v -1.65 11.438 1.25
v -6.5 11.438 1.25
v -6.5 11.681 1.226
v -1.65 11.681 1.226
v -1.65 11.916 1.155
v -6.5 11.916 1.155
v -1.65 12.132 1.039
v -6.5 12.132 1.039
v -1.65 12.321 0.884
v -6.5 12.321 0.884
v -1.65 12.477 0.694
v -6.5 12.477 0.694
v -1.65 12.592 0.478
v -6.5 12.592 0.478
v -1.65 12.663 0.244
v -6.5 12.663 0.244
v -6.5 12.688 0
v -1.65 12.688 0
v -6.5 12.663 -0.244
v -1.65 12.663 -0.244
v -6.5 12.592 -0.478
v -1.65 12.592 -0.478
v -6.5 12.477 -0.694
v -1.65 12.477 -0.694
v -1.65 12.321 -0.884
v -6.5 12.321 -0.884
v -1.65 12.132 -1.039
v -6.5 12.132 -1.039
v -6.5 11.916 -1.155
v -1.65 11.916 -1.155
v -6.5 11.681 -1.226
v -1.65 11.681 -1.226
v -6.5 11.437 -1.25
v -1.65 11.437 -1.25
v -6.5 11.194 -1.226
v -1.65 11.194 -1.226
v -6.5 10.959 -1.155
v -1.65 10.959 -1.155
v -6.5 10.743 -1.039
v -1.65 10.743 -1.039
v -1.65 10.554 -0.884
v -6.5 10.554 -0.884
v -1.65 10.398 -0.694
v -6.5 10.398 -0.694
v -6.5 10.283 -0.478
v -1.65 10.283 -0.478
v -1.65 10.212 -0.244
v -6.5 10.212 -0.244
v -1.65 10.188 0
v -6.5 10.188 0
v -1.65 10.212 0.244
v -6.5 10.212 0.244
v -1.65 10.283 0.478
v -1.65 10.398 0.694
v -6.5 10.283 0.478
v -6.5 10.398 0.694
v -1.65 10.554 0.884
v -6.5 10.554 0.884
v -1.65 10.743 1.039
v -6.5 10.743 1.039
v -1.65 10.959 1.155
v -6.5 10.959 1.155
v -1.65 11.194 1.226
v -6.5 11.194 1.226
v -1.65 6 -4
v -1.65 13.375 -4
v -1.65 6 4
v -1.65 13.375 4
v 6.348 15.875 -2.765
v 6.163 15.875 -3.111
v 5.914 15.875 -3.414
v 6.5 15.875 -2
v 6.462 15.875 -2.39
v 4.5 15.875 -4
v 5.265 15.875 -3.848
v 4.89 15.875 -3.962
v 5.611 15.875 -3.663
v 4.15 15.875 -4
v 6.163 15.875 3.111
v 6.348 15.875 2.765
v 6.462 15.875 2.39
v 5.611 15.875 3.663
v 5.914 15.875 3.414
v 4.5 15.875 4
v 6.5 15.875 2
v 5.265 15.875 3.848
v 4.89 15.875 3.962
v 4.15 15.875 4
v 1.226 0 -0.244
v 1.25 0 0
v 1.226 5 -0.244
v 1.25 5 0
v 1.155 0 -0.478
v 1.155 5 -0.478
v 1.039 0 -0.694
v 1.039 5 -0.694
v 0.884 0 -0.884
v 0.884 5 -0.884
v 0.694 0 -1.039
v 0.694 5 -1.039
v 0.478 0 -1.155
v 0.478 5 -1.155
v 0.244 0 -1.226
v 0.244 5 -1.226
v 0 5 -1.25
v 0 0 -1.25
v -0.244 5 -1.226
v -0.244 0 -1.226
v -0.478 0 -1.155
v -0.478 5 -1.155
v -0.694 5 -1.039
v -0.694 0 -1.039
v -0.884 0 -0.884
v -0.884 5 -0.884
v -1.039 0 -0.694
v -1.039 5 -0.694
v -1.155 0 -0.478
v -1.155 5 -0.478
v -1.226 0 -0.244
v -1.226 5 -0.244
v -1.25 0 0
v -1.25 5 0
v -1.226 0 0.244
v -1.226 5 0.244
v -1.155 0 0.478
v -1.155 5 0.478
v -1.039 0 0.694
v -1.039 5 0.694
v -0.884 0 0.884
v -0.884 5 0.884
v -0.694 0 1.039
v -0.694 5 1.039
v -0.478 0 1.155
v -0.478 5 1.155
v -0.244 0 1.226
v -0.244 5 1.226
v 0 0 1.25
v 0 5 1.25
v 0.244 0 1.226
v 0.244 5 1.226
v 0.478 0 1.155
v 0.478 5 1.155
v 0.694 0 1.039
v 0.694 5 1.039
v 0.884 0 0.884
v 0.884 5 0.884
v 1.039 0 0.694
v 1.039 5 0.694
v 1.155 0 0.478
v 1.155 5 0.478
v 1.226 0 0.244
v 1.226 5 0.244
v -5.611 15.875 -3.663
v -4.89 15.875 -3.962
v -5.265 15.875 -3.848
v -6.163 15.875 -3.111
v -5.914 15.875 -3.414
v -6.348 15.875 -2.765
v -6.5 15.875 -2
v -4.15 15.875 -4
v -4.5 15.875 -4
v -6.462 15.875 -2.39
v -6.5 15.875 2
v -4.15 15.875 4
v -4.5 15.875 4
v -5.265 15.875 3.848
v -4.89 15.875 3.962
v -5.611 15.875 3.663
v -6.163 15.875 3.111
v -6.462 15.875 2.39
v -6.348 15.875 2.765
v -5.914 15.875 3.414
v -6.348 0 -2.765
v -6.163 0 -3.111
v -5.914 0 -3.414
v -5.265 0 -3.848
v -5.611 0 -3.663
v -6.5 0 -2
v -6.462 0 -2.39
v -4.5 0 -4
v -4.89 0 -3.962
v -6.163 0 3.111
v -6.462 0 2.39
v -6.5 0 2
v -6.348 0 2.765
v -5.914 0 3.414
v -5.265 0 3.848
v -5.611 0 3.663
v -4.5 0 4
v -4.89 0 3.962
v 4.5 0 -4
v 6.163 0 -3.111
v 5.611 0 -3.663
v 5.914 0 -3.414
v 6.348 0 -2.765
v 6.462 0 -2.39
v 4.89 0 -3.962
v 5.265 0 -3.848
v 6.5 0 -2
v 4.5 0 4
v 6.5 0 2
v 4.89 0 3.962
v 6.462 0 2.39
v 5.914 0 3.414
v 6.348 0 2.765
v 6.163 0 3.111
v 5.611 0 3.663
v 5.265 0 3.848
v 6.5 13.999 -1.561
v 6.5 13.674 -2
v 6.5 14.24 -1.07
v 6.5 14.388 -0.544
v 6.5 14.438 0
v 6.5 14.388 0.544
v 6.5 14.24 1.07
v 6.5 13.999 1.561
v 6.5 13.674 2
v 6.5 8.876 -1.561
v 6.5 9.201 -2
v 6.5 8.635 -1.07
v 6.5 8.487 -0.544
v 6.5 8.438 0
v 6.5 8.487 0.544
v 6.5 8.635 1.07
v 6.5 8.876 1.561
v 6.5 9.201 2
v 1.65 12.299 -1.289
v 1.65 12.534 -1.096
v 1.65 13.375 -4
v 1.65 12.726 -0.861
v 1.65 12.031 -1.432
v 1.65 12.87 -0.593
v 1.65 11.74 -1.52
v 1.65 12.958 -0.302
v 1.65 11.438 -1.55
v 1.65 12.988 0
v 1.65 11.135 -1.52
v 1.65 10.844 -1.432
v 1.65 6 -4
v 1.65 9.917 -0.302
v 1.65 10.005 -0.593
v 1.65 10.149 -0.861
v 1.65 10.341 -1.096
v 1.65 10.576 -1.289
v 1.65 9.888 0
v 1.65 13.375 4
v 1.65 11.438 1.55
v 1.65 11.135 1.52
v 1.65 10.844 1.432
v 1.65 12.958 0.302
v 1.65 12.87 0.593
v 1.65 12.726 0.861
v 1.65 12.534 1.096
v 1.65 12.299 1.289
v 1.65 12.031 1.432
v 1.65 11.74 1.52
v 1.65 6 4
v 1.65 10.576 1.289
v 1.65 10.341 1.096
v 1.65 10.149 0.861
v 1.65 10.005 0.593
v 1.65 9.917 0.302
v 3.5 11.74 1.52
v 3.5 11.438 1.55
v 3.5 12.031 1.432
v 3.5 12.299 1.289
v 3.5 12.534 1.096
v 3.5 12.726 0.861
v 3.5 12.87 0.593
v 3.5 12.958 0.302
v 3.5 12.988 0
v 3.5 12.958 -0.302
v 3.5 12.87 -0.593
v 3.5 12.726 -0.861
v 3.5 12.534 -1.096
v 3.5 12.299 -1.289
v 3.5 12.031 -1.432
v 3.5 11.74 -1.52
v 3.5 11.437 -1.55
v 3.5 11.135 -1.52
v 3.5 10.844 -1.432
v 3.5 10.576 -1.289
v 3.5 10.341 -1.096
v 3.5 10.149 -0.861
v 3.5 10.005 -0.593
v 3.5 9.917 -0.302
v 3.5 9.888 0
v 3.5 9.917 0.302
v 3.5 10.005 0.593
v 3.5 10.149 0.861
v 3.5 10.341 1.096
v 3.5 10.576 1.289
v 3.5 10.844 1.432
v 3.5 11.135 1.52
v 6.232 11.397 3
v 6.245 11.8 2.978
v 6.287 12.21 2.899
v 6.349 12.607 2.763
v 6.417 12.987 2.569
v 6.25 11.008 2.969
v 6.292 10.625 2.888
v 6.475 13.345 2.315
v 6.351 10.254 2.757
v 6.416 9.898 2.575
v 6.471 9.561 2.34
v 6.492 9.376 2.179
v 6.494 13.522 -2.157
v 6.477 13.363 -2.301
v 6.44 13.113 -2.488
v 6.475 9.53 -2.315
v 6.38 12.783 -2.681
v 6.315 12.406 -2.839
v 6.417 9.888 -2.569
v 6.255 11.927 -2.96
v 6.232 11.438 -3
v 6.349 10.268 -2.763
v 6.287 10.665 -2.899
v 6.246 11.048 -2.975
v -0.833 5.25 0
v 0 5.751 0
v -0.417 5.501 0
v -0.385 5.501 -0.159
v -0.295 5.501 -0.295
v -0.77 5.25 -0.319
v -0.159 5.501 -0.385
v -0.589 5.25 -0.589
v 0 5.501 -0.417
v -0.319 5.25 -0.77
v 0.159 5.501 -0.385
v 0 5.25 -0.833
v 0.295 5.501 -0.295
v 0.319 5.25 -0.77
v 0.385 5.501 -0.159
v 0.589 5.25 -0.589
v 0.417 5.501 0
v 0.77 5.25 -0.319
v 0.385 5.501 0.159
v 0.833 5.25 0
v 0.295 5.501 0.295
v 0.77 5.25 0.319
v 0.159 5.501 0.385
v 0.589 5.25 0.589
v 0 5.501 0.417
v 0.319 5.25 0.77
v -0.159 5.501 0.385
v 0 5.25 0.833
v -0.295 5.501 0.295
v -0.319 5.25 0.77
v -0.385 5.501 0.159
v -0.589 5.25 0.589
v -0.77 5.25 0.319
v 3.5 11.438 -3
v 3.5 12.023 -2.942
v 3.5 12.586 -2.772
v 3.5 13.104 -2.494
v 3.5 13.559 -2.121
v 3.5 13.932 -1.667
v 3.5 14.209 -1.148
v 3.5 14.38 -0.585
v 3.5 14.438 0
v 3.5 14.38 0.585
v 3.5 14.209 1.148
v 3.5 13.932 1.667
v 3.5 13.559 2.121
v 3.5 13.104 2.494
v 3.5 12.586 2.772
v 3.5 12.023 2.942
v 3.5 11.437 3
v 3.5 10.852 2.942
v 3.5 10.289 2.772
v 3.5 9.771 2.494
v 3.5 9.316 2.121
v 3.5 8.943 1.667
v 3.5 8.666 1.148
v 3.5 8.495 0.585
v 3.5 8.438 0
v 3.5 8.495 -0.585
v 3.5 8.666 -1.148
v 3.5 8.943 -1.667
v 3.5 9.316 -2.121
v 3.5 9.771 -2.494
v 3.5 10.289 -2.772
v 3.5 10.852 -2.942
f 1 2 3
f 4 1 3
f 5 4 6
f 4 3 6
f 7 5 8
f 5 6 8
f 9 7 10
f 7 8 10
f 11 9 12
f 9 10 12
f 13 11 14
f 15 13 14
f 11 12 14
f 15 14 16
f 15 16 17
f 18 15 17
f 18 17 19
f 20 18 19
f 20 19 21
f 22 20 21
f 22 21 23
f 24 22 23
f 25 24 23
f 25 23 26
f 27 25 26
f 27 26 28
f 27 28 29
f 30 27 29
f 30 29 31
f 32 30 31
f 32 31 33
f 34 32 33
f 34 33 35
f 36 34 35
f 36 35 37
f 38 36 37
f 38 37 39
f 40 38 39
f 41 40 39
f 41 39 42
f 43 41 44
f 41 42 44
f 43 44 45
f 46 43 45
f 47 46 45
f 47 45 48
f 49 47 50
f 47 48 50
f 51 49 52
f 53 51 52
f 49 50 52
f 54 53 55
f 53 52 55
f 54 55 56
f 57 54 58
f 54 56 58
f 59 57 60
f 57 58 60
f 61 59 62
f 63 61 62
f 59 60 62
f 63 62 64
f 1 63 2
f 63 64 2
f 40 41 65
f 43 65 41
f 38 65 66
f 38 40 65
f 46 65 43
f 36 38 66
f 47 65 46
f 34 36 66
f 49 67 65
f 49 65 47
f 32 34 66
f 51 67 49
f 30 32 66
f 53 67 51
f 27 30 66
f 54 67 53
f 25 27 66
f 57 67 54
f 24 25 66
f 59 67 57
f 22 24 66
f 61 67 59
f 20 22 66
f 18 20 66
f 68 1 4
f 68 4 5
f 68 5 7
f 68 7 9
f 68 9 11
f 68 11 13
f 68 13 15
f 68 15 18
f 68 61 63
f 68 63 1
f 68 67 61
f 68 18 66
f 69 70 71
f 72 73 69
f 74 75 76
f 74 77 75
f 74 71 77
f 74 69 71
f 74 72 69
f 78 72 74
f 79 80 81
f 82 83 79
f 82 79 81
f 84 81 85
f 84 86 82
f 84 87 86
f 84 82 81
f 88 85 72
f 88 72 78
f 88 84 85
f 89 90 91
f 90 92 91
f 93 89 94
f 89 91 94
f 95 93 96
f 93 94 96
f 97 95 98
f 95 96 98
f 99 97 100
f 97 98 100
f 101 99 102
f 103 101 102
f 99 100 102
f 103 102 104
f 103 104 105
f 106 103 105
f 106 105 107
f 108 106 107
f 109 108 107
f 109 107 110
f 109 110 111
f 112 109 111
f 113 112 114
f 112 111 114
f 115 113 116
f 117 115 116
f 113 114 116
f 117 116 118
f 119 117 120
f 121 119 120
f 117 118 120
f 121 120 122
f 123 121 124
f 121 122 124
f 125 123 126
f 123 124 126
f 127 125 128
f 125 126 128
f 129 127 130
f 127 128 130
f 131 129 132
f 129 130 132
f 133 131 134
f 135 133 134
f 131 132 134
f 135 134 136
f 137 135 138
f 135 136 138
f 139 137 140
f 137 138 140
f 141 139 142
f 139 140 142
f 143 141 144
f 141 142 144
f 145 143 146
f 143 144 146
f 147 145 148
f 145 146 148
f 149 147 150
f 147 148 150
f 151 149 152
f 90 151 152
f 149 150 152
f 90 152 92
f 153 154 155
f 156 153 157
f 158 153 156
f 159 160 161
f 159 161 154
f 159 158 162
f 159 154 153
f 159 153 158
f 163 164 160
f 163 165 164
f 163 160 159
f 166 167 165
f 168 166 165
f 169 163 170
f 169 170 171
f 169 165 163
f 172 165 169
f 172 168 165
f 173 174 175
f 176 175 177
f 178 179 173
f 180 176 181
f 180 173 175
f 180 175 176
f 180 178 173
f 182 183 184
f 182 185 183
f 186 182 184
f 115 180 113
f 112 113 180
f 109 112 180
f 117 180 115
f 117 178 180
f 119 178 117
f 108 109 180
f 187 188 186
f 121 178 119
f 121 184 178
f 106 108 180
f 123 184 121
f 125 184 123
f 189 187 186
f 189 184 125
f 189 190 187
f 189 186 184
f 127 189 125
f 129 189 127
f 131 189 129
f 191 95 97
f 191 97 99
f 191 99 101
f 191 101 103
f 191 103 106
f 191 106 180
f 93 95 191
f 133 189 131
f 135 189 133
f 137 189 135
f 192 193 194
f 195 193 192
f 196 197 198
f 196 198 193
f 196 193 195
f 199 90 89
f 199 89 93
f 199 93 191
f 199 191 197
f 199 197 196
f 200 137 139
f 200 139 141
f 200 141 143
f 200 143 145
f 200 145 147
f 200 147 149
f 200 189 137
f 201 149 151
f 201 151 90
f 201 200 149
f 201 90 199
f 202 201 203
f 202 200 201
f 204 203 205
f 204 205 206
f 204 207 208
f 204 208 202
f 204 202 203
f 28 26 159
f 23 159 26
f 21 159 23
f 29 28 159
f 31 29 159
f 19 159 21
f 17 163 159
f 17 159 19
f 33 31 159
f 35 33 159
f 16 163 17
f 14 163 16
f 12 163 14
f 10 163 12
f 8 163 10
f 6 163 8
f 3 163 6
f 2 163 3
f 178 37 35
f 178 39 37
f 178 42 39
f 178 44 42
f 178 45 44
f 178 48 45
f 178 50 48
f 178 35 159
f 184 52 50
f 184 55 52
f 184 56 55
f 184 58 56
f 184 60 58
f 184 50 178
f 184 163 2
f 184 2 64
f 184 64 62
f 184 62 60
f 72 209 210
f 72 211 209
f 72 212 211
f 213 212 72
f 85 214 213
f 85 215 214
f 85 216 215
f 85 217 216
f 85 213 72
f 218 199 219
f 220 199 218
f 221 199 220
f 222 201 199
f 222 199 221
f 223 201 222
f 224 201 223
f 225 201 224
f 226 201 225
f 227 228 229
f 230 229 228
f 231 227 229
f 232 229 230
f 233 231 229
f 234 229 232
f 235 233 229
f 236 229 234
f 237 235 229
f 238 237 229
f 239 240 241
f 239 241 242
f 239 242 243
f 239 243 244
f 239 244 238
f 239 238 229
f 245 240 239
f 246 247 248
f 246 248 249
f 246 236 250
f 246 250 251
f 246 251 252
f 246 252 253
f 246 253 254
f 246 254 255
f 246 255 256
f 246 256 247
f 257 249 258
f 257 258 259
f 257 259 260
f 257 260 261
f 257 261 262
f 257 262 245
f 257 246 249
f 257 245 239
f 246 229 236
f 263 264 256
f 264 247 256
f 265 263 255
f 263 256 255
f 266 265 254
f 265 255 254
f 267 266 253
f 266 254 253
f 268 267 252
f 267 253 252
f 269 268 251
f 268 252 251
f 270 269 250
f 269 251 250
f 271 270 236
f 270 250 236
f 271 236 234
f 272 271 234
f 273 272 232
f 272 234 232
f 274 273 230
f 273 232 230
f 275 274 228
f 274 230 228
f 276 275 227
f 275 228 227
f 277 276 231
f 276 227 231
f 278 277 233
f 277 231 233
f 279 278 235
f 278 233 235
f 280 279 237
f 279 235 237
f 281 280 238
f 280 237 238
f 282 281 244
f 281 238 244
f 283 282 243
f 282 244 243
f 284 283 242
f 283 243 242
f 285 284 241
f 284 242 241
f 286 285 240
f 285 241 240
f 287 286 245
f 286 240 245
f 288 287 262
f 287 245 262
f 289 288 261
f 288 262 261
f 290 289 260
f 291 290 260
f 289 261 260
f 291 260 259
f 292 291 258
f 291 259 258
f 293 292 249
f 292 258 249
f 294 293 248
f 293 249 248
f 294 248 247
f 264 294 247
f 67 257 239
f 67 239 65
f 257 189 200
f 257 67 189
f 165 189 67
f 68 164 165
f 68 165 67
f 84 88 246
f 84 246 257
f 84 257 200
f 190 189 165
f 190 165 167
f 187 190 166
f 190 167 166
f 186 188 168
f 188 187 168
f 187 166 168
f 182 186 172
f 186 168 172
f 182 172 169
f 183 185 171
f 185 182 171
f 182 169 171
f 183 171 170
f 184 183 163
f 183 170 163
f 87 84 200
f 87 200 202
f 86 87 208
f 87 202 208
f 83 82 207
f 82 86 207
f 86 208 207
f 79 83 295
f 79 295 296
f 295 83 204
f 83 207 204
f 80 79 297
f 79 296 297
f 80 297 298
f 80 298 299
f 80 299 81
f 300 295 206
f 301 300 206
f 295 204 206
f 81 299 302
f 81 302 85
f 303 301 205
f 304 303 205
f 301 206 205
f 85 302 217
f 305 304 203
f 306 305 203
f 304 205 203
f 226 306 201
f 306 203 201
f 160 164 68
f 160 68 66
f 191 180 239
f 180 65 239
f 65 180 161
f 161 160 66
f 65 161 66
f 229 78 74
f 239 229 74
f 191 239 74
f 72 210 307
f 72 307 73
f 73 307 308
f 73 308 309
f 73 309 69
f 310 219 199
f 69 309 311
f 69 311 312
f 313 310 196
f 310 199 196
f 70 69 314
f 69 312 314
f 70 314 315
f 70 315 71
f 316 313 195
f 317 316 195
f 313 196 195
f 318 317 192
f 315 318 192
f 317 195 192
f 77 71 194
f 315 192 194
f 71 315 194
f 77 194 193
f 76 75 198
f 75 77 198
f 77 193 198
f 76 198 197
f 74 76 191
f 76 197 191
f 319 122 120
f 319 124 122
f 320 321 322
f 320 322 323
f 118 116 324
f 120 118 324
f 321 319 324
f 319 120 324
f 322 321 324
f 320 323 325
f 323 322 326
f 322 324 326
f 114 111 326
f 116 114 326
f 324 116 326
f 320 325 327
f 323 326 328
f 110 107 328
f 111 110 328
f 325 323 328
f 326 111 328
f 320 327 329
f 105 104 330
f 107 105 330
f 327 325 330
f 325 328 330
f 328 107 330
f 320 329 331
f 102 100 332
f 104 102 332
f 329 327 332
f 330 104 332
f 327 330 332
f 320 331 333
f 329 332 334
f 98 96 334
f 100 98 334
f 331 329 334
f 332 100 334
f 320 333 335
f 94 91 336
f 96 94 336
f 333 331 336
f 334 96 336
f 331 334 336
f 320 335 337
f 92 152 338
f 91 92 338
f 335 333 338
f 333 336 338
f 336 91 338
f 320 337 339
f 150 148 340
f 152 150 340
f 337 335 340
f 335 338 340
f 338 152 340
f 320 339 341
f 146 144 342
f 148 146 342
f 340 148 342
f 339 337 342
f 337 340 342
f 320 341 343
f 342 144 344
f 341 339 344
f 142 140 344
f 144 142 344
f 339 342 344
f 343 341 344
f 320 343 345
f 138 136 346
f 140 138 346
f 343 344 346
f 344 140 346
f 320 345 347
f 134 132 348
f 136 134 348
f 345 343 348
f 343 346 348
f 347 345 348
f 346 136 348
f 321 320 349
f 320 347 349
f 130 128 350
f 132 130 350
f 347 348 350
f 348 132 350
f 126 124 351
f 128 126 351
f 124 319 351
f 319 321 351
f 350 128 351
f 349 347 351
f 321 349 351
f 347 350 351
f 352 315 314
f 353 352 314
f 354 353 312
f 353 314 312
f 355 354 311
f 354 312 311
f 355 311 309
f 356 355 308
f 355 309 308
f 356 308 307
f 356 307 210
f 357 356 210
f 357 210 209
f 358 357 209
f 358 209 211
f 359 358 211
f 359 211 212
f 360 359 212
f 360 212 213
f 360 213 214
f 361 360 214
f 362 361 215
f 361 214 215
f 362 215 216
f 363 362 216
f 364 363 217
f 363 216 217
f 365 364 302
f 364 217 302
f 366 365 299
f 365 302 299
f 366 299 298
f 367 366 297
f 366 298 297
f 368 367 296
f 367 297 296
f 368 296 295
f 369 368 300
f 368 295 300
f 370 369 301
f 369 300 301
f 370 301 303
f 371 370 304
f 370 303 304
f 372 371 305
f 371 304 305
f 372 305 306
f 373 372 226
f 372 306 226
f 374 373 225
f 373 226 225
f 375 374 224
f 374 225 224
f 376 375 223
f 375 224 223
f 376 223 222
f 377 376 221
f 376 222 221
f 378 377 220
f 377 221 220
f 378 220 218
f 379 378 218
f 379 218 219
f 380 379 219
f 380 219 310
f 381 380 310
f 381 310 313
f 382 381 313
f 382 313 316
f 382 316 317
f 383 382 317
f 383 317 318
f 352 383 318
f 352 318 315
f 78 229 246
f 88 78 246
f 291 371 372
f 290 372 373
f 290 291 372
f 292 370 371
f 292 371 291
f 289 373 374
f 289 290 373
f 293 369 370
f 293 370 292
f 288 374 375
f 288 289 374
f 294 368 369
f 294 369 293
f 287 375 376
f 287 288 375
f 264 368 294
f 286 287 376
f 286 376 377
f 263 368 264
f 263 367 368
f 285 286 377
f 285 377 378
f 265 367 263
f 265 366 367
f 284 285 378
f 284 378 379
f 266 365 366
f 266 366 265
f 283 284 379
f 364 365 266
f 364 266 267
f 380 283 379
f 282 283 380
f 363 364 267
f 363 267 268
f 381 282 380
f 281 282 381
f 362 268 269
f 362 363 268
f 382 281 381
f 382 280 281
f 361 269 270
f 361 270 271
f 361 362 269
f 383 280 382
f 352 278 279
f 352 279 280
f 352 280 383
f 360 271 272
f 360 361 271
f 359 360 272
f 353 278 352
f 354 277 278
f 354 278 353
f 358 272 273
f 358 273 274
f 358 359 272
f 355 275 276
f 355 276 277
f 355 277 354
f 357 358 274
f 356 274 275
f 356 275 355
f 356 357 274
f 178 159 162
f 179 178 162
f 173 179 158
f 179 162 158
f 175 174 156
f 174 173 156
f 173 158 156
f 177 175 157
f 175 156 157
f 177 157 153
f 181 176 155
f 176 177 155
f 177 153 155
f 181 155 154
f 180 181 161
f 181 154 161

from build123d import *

# Parameters (mm, degrees)
BOSS_EXTRUDE1_DEPTH            = 4
M3X0_5_TAPPED_HOLE1_D          = 2.5
CBORE_FOR_M3_SHCS1_D           = 3.1
CBORE_FOR_M3_SHCS1_DEPTH       = 4.85
CBORE_FOR_M3_SHCS1_CBORE_D     = 6
CBORE_FOR_M3_SHCS1_CBORE_DEPTH = 3
CBORE_FOR_M3_SHCS1_TIP         = 0.931333959
M3_TAPPED_HOLE1_D              = 2.5
M3_TAPPED_HOLE1_DEPTH          = 5
M3_TAPPED_HOLE1_TIP            = 0.751075774
CHAMFER1_SIZE                  = 2.5
FILLET1_R                      = 2


with BuildPart() as part:
    # Sketch1 → Boss-Extrude1 (new, symmetric)
    with BuildSketch(Plane.XY):
        Polygon((-6.5, 0), (6.5, 0), (6.5, 15.875), (1.65, 15.875), (1.65, 6), (-1.65, 6), (-1.65, 15.875), (-6.5, 15.875), align=None)
    extrude(amount=BOSS_EXTRUDE1_DEPTH, both=True)

    # M3x0.5 Tapped Hole1 (through all)
    with Locations(Plane(origin=(6.5, 0, 0), x_dir=(0, 0, -1), z_dir=(1, 0, 0))):
        with Locations((0, 11.4375)):
            Hole(M3X0_5_TAPPED_HOLE1_D / 2)

    # CBORE for M3 SHCS1
    with Locations(Plane(origin=(6.5, 0, 0), x_dir=(0, 0, -1), z_dir=(1, 0, 0))):
        with Locations((0, 11.4375)):
            CounterBoreHole(CBORE_FOR_M3_SHCS1_D / 2, CBORE_FOR_M3_SHCS1_CBORE_D / 2, CBORE_FOR_M3_SHCS1_CBORE_DEPTH, depth=CBORE_FOR_M3_SHCS1_DEPTH)
            with Locations((0, 0, -(CBORE_FOR_M3_SHCS1_DEPTH + CBORE_FOR_M3_SHCS1_TIP / 2))):  # 118° drill point
                Cone(0, CBORE_FOR_M3_SHCS1_D / 2, CBORE_FOR_M3_SHCS1_TIP, mode=Mode.SUBTRACT)

    # M3 Tapped Hole1
    with Locations(Plane(origin=(0, 0, 0), x_dir=(-1, 0, 0), z_dir=(0, -1, 0))):
        with Locations((0, 0)):
            Hole(M3_TAPPED_HOLE1_D / 2, depth=M3_TAPPED_HOLE1_DEPTH)
            with Locations((0, 0, -(M3_TAPPED_HOLE1_DEPTH + M3_TAPPED_HOLE1_TIP / 2))):  # 118° drill point
                Cone(0, M3_TAPPED_HOLE1_D / 2, M3_TAPPED_HOLE1_TIP, mode=Mode.SUBTRACT)

    # Chamfer1
    chamfer1_edges = [part.edges().sort_by_distance(p)[0] for p in [
        (-1.65, 15.875, 0),
        (1.65, 15.875, 0),
    ]]
    chamfer(chamfer1_edges, length=CHAMFER1_SIZE)

    # Fillet1
    # the kernel refuses this fillet: 2 mm, written as the material it takes off along each edge
    with BuildSketch(Plane(origin=(6.5, -5, -4), x_dir=(-1, 0, 0), z_dir=(0, 1, 0)), Plane(origin=(-6.5, 20.875, 4), x_dir=(0, 0, -1), z_dir=(0, -1, 0)), Plane(origin=(6.5, -5, 4), x_dir=(0, 0, -1), z_dir=(0, 1, 0)), Plane(origin=(-6.5, 20.875, -4), x_dir=(1, 0, 0), z_dir=(0, -1, 0))) as fillet1_piece_1:
        with BuildLine():
            CenterArc((FILLET1_R, FILLET1_R), FILLET1_R, 180, 90)
            Line((0, FILLET1_R), (0, 0))
            Line((0, 0), (FILLET1_R, 0))
        make_face()
    extrude(amount=25.875, mode=Mode.SUBTRACT)


solid = part.part
